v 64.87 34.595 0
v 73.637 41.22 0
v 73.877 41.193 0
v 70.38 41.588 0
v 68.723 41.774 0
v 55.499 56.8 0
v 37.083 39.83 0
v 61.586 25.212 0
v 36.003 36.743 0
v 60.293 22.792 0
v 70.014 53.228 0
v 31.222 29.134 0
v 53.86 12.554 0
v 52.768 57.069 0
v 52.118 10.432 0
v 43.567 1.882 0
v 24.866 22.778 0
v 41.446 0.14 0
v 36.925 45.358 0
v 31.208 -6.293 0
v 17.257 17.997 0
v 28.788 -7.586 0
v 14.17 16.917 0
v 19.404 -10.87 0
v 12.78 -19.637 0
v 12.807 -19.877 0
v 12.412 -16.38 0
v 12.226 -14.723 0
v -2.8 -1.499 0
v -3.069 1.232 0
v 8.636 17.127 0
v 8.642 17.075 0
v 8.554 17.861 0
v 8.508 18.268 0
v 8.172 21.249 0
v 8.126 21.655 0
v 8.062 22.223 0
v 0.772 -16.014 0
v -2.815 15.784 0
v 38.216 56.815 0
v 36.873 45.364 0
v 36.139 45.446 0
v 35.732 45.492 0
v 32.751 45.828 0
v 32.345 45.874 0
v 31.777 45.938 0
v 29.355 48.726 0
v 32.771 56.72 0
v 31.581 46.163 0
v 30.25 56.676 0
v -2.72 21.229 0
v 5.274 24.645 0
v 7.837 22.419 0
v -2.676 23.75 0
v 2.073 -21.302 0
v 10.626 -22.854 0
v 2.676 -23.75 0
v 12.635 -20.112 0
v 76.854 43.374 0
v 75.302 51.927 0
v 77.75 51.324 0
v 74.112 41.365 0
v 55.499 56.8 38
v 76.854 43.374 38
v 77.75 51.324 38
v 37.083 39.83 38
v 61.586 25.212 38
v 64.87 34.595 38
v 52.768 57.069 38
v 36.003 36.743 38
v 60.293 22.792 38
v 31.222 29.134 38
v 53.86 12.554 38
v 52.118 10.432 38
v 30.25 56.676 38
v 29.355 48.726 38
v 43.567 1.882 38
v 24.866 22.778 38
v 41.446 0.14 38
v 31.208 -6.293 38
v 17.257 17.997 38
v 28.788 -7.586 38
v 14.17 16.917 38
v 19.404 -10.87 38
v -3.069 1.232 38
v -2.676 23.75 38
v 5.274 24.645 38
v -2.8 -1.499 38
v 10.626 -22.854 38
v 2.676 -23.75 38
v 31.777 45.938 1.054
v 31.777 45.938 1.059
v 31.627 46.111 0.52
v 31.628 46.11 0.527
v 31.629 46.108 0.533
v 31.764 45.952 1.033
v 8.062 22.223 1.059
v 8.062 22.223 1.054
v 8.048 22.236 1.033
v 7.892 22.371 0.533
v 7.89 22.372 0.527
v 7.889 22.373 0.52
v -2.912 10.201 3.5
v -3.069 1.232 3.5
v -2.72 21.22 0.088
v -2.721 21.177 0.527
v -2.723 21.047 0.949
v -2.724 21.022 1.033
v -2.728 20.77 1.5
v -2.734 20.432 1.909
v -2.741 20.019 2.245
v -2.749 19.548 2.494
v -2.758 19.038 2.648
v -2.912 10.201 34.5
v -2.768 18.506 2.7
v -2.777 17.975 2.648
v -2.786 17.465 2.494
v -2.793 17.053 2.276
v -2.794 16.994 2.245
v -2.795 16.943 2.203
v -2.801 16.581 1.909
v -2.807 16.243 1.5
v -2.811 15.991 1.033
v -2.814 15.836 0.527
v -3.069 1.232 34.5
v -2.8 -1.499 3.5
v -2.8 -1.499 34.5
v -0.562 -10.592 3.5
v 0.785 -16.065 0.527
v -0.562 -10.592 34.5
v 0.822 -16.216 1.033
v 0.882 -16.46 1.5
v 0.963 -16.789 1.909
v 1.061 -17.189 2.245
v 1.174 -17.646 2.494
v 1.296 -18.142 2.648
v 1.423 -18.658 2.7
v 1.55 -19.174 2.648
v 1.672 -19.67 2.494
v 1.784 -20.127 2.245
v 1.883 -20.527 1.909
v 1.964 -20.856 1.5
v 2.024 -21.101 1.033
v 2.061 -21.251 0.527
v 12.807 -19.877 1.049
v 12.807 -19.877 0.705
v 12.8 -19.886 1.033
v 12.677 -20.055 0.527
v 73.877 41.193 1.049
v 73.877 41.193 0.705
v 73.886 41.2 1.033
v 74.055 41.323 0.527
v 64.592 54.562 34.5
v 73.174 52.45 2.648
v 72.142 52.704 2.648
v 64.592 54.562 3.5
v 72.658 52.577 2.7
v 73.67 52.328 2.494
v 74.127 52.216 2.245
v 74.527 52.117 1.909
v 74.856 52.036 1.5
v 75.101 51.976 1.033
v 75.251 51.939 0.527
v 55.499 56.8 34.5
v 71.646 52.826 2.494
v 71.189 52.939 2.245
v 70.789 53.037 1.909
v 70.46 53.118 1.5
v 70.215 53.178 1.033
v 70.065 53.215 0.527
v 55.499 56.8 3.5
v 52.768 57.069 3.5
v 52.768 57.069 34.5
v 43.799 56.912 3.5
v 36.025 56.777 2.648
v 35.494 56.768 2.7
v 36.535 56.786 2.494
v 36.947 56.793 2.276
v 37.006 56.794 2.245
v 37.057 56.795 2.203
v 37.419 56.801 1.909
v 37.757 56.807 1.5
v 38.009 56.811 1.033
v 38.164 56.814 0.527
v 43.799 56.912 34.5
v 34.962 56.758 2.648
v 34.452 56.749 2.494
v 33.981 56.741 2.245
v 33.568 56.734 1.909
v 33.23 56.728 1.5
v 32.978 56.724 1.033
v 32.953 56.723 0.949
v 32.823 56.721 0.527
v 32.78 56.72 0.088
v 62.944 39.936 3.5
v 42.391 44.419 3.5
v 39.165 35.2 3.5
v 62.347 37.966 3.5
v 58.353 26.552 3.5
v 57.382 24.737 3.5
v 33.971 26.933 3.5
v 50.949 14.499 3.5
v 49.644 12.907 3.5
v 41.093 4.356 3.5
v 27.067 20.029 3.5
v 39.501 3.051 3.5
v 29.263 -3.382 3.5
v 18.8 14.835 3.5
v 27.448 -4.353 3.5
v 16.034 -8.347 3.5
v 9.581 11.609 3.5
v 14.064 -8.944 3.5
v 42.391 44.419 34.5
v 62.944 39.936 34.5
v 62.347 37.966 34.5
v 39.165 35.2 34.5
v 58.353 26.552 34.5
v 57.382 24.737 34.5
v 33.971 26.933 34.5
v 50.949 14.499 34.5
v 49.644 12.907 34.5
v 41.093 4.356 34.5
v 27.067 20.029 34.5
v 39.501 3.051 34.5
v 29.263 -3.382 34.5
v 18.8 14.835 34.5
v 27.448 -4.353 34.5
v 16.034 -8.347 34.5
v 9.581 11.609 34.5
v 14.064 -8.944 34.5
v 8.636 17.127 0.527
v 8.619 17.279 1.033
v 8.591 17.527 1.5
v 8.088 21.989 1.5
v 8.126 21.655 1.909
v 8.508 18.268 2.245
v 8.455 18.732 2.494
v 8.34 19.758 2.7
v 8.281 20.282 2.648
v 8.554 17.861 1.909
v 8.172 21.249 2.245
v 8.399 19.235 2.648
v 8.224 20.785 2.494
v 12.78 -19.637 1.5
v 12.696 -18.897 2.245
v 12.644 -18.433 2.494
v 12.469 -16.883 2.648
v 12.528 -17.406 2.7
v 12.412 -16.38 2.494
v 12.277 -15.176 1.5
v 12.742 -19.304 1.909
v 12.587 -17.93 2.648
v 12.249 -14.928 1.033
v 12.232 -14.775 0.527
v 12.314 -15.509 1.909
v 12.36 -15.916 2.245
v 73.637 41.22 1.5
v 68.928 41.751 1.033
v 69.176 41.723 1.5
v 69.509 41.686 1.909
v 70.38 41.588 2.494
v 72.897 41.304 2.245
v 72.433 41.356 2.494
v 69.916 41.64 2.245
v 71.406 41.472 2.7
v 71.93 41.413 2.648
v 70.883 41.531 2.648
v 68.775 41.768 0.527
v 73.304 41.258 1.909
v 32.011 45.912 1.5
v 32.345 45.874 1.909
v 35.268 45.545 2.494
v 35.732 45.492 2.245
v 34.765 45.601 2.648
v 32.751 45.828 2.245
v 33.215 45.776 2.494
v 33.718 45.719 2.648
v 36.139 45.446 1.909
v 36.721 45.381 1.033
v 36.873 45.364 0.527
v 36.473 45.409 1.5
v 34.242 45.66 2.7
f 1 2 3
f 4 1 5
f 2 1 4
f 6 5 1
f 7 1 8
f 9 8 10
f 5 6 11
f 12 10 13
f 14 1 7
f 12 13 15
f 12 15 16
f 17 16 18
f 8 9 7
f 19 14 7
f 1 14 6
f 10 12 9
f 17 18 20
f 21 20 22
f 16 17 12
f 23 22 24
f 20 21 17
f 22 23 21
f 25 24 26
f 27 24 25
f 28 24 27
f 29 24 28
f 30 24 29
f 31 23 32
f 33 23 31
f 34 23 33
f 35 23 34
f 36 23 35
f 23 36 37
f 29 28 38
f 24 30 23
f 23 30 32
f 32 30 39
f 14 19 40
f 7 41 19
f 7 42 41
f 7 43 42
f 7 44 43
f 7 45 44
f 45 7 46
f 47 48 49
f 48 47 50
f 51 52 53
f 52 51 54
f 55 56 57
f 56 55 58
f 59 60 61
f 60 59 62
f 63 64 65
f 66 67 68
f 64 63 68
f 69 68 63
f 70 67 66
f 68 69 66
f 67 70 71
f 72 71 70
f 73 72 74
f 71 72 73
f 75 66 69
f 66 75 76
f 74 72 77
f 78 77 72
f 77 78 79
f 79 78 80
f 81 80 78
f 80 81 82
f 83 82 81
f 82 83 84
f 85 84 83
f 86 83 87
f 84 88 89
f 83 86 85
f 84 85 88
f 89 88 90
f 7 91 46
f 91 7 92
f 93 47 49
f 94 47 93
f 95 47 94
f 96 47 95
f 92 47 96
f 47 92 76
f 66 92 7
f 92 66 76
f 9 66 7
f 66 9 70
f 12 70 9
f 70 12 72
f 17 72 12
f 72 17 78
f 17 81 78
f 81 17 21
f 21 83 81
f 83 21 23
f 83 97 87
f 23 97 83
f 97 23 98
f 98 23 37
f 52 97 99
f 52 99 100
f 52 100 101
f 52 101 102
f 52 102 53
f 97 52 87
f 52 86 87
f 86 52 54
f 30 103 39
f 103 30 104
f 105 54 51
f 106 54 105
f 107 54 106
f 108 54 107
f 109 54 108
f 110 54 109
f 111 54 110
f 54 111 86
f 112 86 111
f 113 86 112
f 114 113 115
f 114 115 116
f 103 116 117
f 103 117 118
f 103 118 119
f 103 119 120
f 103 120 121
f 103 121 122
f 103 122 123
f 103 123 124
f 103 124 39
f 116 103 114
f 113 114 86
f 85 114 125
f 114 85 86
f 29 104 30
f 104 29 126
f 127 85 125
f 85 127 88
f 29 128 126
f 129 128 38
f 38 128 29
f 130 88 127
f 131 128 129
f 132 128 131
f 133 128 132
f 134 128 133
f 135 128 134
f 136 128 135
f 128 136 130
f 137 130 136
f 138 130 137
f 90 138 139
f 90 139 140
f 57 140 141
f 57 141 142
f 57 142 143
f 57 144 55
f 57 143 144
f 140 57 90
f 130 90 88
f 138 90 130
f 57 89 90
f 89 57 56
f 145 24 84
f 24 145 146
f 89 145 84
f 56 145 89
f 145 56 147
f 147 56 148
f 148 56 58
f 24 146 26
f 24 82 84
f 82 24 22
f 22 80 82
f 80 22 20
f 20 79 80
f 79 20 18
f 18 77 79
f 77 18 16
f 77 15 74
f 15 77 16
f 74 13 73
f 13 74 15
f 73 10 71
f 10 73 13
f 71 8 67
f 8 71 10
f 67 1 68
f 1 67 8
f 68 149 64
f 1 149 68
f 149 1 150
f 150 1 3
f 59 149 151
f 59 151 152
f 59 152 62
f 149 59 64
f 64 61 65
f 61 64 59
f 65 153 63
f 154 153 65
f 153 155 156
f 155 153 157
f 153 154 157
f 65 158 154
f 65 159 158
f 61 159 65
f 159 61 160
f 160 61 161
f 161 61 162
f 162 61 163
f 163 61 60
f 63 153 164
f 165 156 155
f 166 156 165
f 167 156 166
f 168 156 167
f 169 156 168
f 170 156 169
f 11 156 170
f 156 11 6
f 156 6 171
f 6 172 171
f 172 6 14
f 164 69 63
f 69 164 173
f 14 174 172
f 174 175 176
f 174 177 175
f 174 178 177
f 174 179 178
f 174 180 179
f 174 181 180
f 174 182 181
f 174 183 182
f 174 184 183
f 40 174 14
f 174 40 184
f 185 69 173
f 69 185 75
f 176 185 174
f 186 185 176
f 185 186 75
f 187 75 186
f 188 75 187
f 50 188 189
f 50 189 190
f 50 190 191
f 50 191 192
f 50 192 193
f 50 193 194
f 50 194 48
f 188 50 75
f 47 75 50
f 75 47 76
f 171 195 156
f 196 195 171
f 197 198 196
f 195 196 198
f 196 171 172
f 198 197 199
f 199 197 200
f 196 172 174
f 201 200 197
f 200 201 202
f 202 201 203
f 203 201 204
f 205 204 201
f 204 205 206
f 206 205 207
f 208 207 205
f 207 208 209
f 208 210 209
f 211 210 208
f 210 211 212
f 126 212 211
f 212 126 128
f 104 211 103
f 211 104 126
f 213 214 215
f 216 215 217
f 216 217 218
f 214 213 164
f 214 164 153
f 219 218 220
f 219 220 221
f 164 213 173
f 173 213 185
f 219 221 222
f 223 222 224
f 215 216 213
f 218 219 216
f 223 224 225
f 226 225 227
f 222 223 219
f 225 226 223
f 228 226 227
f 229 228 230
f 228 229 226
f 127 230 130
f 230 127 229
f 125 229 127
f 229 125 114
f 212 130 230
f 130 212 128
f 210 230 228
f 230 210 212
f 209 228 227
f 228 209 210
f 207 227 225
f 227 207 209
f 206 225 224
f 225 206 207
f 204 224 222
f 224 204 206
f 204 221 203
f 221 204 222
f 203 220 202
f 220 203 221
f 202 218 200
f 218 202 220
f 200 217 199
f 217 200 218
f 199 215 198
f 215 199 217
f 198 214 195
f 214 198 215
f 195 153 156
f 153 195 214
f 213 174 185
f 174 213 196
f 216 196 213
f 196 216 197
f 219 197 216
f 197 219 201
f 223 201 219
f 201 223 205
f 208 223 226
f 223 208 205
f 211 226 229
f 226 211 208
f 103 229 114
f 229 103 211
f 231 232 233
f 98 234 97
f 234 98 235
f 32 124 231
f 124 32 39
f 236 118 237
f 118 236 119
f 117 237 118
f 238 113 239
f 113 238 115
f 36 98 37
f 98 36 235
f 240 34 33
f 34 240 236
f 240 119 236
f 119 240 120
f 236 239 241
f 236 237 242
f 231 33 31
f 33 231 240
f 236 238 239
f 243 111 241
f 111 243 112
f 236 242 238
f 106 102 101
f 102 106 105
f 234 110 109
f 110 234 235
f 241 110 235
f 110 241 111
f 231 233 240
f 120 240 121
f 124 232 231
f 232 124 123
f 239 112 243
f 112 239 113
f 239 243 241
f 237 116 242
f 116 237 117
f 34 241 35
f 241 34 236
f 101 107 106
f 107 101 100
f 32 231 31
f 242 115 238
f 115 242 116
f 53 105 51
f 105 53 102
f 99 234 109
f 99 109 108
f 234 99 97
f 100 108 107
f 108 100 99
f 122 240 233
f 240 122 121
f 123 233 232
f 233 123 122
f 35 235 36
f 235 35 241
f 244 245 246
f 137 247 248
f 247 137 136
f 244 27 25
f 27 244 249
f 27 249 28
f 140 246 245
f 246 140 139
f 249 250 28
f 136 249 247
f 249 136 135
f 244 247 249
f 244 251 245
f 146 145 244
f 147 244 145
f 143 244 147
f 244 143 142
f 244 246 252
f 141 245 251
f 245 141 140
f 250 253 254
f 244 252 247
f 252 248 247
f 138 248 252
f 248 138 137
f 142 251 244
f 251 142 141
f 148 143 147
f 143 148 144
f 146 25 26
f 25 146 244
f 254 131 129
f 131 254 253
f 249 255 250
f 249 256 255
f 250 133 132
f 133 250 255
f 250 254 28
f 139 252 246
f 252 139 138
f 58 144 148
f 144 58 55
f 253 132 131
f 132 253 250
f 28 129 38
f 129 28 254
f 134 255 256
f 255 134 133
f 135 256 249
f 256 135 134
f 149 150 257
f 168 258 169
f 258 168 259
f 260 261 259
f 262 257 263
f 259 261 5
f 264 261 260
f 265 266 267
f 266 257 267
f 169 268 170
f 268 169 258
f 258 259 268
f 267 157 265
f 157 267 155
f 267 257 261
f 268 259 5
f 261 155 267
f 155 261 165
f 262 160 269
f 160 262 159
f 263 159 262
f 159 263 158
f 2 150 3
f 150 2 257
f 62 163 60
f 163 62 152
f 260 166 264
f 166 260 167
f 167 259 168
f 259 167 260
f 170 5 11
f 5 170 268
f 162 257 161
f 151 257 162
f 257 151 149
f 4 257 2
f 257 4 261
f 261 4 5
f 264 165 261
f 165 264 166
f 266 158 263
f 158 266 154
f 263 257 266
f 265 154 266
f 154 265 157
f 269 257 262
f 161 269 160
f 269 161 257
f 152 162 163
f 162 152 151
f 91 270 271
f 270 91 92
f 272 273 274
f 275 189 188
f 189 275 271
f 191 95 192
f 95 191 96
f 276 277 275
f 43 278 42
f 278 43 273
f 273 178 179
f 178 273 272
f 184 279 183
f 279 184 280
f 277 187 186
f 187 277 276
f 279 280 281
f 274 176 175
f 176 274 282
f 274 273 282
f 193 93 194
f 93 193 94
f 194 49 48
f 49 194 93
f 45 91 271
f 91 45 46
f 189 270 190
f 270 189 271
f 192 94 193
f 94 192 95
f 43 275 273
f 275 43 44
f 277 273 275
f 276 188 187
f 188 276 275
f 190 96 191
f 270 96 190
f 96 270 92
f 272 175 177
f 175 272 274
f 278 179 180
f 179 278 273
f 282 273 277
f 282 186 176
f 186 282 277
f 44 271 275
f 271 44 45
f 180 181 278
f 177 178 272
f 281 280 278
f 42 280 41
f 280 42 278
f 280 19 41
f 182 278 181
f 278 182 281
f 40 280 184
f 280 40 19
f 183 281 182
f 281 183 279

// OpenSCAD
$fn = 32;

// ----------------------------------------------------------------------
// Air duct: 28 mm duct, 3.5 mm wall, 38 mm across
// ----------------------------------------------------------------------

// --- parameters (mm) ---
duct_r = 14;              // duct core radius
duct_d = 28;              // duct core diameter
wall = 3.5;               // duct wall thickness
height = 38;              // duct width (extrusion height)
port_r = 23.9;            // port flange half width
port_d = 47.8;            // port flange width
port_t = 8;               // port flange thickness
bolt_d = 5.4;             // port bolt holes
bolt_offset = 18.7;       // bolt hole offset from the port axis

difference() {
  /* outer hull chain: tube with a flat flange plate at every port */
  linear_extrude(height = 38) {
    hull() {
      polygon([[2.676, -23.75], [-2.676, 23.75], [5.274, 24.645], [10.626, -22.854]]);
      translate([10.931, 1.232]) circle(r = 14);
    }
    hull() {
      translate([10.931, 1.232]) circle(r = 14);
      translate([12.016, 1.354]) circle(r = 14);
    }
    hull() {
      translate([12.016, 1.354]) circle(r = 14);
      translate([23.43, 5.348]) circle(r = 14);
    }
    hull() {
      translate([23.43, 5.348]) circle(r = 14);
      translate([33.668, 11.781]) circle(r = 14);
    }
    hull() {
      translate([33.668, 11.781]) circle(r = 14);
      translate([42.219, 20.332]) circle(r = 14);
    }
    hull() {
      translate([42.219, 20.332]) circle(r = 14);
      translate([48.652, 30.57]) circle(r = 14);
    }
    hull() {
      translate([48.652, 30.57]) circle(r = 14);
      translate([52.646, 41.984]) circle(r = 14);
    }
    hull() {
      translate([52.646, 41.984]) circle(r = 14);
      translate([52.768, 43.069]) circle(r = 14);
    }
    hull() {
      translate([52.768, 43.069]) circle(r = 14);
      polygon([[30.25, 56.676], [77.75, 51.324], [76.854, 43.374], [29.355, 48.726]]);
    }
  }
  /* air passage: the same chain inset by the wall, 5 mm proud of the ports */
  translate([0, 0, 3.5]) linear_extrude(height = 31) {
    hull() {
      translate([-4.969, -0.56]) circle(r = 10.5);
      translate([12.016, 1.354]) circle(r = 10.5);
    }
    hull() {
      translate([12.016, 1.354]) circle(r = 10.5);
      translate([23.43, 5.348]) circle(r = 10.5);
    }
    hull() {
      translate([23.43, 5.348]) circle(r = 10.5);
      translate([33.668, 11.781]) circle(r = 10.5);
    }
    hull() {
      translate([33.668, 11.781]) circle(r = 10.5);
      translate([42.219, 20.332]) circle(r = 10.5);
    }
    hull() {
      translate([42.219, 20.332]) circle(r = 10.5);
      translate([48.652, 30.57]) circle(r = 10.5);
    }
    hull() {
      translate([48.652, 30.57]) circle(r = 10.5);
      translate([52.646, 41.984]) circle(r = 10.5);
    }
    hull() {
      translate([52.646, 41.984]) circle(r = 10.5);
      translate([54.56, 58.969]) circle(r = 10.5);
    }
  }
  translate([0, 0]) rotate([0, 0, -83.57]) translate([-18.7, -2.5]) rotate([-90, 0, 0]) cylinder(h = 13, d = 5.4);
  translate([0, 0]) rotate([0, 0, -83.57]) translate([18.7, -2.5]) rotate([-90, 0, 0]) cylinder(h = 13, d = 5.4);
  translate([54, 54]) rotate([0, 0, 173.57]) translate([-18.7, -2.5]) rotate([-90, 0, 0]) cylinder(h = 13, d = 5.4);
  translate([54, 54]) rotate([0, 0, 173.57]) translate([18.7, -2.5]) rotate([-90, 0, 0]) cylinder(h = 13, d = 5.4);
}
